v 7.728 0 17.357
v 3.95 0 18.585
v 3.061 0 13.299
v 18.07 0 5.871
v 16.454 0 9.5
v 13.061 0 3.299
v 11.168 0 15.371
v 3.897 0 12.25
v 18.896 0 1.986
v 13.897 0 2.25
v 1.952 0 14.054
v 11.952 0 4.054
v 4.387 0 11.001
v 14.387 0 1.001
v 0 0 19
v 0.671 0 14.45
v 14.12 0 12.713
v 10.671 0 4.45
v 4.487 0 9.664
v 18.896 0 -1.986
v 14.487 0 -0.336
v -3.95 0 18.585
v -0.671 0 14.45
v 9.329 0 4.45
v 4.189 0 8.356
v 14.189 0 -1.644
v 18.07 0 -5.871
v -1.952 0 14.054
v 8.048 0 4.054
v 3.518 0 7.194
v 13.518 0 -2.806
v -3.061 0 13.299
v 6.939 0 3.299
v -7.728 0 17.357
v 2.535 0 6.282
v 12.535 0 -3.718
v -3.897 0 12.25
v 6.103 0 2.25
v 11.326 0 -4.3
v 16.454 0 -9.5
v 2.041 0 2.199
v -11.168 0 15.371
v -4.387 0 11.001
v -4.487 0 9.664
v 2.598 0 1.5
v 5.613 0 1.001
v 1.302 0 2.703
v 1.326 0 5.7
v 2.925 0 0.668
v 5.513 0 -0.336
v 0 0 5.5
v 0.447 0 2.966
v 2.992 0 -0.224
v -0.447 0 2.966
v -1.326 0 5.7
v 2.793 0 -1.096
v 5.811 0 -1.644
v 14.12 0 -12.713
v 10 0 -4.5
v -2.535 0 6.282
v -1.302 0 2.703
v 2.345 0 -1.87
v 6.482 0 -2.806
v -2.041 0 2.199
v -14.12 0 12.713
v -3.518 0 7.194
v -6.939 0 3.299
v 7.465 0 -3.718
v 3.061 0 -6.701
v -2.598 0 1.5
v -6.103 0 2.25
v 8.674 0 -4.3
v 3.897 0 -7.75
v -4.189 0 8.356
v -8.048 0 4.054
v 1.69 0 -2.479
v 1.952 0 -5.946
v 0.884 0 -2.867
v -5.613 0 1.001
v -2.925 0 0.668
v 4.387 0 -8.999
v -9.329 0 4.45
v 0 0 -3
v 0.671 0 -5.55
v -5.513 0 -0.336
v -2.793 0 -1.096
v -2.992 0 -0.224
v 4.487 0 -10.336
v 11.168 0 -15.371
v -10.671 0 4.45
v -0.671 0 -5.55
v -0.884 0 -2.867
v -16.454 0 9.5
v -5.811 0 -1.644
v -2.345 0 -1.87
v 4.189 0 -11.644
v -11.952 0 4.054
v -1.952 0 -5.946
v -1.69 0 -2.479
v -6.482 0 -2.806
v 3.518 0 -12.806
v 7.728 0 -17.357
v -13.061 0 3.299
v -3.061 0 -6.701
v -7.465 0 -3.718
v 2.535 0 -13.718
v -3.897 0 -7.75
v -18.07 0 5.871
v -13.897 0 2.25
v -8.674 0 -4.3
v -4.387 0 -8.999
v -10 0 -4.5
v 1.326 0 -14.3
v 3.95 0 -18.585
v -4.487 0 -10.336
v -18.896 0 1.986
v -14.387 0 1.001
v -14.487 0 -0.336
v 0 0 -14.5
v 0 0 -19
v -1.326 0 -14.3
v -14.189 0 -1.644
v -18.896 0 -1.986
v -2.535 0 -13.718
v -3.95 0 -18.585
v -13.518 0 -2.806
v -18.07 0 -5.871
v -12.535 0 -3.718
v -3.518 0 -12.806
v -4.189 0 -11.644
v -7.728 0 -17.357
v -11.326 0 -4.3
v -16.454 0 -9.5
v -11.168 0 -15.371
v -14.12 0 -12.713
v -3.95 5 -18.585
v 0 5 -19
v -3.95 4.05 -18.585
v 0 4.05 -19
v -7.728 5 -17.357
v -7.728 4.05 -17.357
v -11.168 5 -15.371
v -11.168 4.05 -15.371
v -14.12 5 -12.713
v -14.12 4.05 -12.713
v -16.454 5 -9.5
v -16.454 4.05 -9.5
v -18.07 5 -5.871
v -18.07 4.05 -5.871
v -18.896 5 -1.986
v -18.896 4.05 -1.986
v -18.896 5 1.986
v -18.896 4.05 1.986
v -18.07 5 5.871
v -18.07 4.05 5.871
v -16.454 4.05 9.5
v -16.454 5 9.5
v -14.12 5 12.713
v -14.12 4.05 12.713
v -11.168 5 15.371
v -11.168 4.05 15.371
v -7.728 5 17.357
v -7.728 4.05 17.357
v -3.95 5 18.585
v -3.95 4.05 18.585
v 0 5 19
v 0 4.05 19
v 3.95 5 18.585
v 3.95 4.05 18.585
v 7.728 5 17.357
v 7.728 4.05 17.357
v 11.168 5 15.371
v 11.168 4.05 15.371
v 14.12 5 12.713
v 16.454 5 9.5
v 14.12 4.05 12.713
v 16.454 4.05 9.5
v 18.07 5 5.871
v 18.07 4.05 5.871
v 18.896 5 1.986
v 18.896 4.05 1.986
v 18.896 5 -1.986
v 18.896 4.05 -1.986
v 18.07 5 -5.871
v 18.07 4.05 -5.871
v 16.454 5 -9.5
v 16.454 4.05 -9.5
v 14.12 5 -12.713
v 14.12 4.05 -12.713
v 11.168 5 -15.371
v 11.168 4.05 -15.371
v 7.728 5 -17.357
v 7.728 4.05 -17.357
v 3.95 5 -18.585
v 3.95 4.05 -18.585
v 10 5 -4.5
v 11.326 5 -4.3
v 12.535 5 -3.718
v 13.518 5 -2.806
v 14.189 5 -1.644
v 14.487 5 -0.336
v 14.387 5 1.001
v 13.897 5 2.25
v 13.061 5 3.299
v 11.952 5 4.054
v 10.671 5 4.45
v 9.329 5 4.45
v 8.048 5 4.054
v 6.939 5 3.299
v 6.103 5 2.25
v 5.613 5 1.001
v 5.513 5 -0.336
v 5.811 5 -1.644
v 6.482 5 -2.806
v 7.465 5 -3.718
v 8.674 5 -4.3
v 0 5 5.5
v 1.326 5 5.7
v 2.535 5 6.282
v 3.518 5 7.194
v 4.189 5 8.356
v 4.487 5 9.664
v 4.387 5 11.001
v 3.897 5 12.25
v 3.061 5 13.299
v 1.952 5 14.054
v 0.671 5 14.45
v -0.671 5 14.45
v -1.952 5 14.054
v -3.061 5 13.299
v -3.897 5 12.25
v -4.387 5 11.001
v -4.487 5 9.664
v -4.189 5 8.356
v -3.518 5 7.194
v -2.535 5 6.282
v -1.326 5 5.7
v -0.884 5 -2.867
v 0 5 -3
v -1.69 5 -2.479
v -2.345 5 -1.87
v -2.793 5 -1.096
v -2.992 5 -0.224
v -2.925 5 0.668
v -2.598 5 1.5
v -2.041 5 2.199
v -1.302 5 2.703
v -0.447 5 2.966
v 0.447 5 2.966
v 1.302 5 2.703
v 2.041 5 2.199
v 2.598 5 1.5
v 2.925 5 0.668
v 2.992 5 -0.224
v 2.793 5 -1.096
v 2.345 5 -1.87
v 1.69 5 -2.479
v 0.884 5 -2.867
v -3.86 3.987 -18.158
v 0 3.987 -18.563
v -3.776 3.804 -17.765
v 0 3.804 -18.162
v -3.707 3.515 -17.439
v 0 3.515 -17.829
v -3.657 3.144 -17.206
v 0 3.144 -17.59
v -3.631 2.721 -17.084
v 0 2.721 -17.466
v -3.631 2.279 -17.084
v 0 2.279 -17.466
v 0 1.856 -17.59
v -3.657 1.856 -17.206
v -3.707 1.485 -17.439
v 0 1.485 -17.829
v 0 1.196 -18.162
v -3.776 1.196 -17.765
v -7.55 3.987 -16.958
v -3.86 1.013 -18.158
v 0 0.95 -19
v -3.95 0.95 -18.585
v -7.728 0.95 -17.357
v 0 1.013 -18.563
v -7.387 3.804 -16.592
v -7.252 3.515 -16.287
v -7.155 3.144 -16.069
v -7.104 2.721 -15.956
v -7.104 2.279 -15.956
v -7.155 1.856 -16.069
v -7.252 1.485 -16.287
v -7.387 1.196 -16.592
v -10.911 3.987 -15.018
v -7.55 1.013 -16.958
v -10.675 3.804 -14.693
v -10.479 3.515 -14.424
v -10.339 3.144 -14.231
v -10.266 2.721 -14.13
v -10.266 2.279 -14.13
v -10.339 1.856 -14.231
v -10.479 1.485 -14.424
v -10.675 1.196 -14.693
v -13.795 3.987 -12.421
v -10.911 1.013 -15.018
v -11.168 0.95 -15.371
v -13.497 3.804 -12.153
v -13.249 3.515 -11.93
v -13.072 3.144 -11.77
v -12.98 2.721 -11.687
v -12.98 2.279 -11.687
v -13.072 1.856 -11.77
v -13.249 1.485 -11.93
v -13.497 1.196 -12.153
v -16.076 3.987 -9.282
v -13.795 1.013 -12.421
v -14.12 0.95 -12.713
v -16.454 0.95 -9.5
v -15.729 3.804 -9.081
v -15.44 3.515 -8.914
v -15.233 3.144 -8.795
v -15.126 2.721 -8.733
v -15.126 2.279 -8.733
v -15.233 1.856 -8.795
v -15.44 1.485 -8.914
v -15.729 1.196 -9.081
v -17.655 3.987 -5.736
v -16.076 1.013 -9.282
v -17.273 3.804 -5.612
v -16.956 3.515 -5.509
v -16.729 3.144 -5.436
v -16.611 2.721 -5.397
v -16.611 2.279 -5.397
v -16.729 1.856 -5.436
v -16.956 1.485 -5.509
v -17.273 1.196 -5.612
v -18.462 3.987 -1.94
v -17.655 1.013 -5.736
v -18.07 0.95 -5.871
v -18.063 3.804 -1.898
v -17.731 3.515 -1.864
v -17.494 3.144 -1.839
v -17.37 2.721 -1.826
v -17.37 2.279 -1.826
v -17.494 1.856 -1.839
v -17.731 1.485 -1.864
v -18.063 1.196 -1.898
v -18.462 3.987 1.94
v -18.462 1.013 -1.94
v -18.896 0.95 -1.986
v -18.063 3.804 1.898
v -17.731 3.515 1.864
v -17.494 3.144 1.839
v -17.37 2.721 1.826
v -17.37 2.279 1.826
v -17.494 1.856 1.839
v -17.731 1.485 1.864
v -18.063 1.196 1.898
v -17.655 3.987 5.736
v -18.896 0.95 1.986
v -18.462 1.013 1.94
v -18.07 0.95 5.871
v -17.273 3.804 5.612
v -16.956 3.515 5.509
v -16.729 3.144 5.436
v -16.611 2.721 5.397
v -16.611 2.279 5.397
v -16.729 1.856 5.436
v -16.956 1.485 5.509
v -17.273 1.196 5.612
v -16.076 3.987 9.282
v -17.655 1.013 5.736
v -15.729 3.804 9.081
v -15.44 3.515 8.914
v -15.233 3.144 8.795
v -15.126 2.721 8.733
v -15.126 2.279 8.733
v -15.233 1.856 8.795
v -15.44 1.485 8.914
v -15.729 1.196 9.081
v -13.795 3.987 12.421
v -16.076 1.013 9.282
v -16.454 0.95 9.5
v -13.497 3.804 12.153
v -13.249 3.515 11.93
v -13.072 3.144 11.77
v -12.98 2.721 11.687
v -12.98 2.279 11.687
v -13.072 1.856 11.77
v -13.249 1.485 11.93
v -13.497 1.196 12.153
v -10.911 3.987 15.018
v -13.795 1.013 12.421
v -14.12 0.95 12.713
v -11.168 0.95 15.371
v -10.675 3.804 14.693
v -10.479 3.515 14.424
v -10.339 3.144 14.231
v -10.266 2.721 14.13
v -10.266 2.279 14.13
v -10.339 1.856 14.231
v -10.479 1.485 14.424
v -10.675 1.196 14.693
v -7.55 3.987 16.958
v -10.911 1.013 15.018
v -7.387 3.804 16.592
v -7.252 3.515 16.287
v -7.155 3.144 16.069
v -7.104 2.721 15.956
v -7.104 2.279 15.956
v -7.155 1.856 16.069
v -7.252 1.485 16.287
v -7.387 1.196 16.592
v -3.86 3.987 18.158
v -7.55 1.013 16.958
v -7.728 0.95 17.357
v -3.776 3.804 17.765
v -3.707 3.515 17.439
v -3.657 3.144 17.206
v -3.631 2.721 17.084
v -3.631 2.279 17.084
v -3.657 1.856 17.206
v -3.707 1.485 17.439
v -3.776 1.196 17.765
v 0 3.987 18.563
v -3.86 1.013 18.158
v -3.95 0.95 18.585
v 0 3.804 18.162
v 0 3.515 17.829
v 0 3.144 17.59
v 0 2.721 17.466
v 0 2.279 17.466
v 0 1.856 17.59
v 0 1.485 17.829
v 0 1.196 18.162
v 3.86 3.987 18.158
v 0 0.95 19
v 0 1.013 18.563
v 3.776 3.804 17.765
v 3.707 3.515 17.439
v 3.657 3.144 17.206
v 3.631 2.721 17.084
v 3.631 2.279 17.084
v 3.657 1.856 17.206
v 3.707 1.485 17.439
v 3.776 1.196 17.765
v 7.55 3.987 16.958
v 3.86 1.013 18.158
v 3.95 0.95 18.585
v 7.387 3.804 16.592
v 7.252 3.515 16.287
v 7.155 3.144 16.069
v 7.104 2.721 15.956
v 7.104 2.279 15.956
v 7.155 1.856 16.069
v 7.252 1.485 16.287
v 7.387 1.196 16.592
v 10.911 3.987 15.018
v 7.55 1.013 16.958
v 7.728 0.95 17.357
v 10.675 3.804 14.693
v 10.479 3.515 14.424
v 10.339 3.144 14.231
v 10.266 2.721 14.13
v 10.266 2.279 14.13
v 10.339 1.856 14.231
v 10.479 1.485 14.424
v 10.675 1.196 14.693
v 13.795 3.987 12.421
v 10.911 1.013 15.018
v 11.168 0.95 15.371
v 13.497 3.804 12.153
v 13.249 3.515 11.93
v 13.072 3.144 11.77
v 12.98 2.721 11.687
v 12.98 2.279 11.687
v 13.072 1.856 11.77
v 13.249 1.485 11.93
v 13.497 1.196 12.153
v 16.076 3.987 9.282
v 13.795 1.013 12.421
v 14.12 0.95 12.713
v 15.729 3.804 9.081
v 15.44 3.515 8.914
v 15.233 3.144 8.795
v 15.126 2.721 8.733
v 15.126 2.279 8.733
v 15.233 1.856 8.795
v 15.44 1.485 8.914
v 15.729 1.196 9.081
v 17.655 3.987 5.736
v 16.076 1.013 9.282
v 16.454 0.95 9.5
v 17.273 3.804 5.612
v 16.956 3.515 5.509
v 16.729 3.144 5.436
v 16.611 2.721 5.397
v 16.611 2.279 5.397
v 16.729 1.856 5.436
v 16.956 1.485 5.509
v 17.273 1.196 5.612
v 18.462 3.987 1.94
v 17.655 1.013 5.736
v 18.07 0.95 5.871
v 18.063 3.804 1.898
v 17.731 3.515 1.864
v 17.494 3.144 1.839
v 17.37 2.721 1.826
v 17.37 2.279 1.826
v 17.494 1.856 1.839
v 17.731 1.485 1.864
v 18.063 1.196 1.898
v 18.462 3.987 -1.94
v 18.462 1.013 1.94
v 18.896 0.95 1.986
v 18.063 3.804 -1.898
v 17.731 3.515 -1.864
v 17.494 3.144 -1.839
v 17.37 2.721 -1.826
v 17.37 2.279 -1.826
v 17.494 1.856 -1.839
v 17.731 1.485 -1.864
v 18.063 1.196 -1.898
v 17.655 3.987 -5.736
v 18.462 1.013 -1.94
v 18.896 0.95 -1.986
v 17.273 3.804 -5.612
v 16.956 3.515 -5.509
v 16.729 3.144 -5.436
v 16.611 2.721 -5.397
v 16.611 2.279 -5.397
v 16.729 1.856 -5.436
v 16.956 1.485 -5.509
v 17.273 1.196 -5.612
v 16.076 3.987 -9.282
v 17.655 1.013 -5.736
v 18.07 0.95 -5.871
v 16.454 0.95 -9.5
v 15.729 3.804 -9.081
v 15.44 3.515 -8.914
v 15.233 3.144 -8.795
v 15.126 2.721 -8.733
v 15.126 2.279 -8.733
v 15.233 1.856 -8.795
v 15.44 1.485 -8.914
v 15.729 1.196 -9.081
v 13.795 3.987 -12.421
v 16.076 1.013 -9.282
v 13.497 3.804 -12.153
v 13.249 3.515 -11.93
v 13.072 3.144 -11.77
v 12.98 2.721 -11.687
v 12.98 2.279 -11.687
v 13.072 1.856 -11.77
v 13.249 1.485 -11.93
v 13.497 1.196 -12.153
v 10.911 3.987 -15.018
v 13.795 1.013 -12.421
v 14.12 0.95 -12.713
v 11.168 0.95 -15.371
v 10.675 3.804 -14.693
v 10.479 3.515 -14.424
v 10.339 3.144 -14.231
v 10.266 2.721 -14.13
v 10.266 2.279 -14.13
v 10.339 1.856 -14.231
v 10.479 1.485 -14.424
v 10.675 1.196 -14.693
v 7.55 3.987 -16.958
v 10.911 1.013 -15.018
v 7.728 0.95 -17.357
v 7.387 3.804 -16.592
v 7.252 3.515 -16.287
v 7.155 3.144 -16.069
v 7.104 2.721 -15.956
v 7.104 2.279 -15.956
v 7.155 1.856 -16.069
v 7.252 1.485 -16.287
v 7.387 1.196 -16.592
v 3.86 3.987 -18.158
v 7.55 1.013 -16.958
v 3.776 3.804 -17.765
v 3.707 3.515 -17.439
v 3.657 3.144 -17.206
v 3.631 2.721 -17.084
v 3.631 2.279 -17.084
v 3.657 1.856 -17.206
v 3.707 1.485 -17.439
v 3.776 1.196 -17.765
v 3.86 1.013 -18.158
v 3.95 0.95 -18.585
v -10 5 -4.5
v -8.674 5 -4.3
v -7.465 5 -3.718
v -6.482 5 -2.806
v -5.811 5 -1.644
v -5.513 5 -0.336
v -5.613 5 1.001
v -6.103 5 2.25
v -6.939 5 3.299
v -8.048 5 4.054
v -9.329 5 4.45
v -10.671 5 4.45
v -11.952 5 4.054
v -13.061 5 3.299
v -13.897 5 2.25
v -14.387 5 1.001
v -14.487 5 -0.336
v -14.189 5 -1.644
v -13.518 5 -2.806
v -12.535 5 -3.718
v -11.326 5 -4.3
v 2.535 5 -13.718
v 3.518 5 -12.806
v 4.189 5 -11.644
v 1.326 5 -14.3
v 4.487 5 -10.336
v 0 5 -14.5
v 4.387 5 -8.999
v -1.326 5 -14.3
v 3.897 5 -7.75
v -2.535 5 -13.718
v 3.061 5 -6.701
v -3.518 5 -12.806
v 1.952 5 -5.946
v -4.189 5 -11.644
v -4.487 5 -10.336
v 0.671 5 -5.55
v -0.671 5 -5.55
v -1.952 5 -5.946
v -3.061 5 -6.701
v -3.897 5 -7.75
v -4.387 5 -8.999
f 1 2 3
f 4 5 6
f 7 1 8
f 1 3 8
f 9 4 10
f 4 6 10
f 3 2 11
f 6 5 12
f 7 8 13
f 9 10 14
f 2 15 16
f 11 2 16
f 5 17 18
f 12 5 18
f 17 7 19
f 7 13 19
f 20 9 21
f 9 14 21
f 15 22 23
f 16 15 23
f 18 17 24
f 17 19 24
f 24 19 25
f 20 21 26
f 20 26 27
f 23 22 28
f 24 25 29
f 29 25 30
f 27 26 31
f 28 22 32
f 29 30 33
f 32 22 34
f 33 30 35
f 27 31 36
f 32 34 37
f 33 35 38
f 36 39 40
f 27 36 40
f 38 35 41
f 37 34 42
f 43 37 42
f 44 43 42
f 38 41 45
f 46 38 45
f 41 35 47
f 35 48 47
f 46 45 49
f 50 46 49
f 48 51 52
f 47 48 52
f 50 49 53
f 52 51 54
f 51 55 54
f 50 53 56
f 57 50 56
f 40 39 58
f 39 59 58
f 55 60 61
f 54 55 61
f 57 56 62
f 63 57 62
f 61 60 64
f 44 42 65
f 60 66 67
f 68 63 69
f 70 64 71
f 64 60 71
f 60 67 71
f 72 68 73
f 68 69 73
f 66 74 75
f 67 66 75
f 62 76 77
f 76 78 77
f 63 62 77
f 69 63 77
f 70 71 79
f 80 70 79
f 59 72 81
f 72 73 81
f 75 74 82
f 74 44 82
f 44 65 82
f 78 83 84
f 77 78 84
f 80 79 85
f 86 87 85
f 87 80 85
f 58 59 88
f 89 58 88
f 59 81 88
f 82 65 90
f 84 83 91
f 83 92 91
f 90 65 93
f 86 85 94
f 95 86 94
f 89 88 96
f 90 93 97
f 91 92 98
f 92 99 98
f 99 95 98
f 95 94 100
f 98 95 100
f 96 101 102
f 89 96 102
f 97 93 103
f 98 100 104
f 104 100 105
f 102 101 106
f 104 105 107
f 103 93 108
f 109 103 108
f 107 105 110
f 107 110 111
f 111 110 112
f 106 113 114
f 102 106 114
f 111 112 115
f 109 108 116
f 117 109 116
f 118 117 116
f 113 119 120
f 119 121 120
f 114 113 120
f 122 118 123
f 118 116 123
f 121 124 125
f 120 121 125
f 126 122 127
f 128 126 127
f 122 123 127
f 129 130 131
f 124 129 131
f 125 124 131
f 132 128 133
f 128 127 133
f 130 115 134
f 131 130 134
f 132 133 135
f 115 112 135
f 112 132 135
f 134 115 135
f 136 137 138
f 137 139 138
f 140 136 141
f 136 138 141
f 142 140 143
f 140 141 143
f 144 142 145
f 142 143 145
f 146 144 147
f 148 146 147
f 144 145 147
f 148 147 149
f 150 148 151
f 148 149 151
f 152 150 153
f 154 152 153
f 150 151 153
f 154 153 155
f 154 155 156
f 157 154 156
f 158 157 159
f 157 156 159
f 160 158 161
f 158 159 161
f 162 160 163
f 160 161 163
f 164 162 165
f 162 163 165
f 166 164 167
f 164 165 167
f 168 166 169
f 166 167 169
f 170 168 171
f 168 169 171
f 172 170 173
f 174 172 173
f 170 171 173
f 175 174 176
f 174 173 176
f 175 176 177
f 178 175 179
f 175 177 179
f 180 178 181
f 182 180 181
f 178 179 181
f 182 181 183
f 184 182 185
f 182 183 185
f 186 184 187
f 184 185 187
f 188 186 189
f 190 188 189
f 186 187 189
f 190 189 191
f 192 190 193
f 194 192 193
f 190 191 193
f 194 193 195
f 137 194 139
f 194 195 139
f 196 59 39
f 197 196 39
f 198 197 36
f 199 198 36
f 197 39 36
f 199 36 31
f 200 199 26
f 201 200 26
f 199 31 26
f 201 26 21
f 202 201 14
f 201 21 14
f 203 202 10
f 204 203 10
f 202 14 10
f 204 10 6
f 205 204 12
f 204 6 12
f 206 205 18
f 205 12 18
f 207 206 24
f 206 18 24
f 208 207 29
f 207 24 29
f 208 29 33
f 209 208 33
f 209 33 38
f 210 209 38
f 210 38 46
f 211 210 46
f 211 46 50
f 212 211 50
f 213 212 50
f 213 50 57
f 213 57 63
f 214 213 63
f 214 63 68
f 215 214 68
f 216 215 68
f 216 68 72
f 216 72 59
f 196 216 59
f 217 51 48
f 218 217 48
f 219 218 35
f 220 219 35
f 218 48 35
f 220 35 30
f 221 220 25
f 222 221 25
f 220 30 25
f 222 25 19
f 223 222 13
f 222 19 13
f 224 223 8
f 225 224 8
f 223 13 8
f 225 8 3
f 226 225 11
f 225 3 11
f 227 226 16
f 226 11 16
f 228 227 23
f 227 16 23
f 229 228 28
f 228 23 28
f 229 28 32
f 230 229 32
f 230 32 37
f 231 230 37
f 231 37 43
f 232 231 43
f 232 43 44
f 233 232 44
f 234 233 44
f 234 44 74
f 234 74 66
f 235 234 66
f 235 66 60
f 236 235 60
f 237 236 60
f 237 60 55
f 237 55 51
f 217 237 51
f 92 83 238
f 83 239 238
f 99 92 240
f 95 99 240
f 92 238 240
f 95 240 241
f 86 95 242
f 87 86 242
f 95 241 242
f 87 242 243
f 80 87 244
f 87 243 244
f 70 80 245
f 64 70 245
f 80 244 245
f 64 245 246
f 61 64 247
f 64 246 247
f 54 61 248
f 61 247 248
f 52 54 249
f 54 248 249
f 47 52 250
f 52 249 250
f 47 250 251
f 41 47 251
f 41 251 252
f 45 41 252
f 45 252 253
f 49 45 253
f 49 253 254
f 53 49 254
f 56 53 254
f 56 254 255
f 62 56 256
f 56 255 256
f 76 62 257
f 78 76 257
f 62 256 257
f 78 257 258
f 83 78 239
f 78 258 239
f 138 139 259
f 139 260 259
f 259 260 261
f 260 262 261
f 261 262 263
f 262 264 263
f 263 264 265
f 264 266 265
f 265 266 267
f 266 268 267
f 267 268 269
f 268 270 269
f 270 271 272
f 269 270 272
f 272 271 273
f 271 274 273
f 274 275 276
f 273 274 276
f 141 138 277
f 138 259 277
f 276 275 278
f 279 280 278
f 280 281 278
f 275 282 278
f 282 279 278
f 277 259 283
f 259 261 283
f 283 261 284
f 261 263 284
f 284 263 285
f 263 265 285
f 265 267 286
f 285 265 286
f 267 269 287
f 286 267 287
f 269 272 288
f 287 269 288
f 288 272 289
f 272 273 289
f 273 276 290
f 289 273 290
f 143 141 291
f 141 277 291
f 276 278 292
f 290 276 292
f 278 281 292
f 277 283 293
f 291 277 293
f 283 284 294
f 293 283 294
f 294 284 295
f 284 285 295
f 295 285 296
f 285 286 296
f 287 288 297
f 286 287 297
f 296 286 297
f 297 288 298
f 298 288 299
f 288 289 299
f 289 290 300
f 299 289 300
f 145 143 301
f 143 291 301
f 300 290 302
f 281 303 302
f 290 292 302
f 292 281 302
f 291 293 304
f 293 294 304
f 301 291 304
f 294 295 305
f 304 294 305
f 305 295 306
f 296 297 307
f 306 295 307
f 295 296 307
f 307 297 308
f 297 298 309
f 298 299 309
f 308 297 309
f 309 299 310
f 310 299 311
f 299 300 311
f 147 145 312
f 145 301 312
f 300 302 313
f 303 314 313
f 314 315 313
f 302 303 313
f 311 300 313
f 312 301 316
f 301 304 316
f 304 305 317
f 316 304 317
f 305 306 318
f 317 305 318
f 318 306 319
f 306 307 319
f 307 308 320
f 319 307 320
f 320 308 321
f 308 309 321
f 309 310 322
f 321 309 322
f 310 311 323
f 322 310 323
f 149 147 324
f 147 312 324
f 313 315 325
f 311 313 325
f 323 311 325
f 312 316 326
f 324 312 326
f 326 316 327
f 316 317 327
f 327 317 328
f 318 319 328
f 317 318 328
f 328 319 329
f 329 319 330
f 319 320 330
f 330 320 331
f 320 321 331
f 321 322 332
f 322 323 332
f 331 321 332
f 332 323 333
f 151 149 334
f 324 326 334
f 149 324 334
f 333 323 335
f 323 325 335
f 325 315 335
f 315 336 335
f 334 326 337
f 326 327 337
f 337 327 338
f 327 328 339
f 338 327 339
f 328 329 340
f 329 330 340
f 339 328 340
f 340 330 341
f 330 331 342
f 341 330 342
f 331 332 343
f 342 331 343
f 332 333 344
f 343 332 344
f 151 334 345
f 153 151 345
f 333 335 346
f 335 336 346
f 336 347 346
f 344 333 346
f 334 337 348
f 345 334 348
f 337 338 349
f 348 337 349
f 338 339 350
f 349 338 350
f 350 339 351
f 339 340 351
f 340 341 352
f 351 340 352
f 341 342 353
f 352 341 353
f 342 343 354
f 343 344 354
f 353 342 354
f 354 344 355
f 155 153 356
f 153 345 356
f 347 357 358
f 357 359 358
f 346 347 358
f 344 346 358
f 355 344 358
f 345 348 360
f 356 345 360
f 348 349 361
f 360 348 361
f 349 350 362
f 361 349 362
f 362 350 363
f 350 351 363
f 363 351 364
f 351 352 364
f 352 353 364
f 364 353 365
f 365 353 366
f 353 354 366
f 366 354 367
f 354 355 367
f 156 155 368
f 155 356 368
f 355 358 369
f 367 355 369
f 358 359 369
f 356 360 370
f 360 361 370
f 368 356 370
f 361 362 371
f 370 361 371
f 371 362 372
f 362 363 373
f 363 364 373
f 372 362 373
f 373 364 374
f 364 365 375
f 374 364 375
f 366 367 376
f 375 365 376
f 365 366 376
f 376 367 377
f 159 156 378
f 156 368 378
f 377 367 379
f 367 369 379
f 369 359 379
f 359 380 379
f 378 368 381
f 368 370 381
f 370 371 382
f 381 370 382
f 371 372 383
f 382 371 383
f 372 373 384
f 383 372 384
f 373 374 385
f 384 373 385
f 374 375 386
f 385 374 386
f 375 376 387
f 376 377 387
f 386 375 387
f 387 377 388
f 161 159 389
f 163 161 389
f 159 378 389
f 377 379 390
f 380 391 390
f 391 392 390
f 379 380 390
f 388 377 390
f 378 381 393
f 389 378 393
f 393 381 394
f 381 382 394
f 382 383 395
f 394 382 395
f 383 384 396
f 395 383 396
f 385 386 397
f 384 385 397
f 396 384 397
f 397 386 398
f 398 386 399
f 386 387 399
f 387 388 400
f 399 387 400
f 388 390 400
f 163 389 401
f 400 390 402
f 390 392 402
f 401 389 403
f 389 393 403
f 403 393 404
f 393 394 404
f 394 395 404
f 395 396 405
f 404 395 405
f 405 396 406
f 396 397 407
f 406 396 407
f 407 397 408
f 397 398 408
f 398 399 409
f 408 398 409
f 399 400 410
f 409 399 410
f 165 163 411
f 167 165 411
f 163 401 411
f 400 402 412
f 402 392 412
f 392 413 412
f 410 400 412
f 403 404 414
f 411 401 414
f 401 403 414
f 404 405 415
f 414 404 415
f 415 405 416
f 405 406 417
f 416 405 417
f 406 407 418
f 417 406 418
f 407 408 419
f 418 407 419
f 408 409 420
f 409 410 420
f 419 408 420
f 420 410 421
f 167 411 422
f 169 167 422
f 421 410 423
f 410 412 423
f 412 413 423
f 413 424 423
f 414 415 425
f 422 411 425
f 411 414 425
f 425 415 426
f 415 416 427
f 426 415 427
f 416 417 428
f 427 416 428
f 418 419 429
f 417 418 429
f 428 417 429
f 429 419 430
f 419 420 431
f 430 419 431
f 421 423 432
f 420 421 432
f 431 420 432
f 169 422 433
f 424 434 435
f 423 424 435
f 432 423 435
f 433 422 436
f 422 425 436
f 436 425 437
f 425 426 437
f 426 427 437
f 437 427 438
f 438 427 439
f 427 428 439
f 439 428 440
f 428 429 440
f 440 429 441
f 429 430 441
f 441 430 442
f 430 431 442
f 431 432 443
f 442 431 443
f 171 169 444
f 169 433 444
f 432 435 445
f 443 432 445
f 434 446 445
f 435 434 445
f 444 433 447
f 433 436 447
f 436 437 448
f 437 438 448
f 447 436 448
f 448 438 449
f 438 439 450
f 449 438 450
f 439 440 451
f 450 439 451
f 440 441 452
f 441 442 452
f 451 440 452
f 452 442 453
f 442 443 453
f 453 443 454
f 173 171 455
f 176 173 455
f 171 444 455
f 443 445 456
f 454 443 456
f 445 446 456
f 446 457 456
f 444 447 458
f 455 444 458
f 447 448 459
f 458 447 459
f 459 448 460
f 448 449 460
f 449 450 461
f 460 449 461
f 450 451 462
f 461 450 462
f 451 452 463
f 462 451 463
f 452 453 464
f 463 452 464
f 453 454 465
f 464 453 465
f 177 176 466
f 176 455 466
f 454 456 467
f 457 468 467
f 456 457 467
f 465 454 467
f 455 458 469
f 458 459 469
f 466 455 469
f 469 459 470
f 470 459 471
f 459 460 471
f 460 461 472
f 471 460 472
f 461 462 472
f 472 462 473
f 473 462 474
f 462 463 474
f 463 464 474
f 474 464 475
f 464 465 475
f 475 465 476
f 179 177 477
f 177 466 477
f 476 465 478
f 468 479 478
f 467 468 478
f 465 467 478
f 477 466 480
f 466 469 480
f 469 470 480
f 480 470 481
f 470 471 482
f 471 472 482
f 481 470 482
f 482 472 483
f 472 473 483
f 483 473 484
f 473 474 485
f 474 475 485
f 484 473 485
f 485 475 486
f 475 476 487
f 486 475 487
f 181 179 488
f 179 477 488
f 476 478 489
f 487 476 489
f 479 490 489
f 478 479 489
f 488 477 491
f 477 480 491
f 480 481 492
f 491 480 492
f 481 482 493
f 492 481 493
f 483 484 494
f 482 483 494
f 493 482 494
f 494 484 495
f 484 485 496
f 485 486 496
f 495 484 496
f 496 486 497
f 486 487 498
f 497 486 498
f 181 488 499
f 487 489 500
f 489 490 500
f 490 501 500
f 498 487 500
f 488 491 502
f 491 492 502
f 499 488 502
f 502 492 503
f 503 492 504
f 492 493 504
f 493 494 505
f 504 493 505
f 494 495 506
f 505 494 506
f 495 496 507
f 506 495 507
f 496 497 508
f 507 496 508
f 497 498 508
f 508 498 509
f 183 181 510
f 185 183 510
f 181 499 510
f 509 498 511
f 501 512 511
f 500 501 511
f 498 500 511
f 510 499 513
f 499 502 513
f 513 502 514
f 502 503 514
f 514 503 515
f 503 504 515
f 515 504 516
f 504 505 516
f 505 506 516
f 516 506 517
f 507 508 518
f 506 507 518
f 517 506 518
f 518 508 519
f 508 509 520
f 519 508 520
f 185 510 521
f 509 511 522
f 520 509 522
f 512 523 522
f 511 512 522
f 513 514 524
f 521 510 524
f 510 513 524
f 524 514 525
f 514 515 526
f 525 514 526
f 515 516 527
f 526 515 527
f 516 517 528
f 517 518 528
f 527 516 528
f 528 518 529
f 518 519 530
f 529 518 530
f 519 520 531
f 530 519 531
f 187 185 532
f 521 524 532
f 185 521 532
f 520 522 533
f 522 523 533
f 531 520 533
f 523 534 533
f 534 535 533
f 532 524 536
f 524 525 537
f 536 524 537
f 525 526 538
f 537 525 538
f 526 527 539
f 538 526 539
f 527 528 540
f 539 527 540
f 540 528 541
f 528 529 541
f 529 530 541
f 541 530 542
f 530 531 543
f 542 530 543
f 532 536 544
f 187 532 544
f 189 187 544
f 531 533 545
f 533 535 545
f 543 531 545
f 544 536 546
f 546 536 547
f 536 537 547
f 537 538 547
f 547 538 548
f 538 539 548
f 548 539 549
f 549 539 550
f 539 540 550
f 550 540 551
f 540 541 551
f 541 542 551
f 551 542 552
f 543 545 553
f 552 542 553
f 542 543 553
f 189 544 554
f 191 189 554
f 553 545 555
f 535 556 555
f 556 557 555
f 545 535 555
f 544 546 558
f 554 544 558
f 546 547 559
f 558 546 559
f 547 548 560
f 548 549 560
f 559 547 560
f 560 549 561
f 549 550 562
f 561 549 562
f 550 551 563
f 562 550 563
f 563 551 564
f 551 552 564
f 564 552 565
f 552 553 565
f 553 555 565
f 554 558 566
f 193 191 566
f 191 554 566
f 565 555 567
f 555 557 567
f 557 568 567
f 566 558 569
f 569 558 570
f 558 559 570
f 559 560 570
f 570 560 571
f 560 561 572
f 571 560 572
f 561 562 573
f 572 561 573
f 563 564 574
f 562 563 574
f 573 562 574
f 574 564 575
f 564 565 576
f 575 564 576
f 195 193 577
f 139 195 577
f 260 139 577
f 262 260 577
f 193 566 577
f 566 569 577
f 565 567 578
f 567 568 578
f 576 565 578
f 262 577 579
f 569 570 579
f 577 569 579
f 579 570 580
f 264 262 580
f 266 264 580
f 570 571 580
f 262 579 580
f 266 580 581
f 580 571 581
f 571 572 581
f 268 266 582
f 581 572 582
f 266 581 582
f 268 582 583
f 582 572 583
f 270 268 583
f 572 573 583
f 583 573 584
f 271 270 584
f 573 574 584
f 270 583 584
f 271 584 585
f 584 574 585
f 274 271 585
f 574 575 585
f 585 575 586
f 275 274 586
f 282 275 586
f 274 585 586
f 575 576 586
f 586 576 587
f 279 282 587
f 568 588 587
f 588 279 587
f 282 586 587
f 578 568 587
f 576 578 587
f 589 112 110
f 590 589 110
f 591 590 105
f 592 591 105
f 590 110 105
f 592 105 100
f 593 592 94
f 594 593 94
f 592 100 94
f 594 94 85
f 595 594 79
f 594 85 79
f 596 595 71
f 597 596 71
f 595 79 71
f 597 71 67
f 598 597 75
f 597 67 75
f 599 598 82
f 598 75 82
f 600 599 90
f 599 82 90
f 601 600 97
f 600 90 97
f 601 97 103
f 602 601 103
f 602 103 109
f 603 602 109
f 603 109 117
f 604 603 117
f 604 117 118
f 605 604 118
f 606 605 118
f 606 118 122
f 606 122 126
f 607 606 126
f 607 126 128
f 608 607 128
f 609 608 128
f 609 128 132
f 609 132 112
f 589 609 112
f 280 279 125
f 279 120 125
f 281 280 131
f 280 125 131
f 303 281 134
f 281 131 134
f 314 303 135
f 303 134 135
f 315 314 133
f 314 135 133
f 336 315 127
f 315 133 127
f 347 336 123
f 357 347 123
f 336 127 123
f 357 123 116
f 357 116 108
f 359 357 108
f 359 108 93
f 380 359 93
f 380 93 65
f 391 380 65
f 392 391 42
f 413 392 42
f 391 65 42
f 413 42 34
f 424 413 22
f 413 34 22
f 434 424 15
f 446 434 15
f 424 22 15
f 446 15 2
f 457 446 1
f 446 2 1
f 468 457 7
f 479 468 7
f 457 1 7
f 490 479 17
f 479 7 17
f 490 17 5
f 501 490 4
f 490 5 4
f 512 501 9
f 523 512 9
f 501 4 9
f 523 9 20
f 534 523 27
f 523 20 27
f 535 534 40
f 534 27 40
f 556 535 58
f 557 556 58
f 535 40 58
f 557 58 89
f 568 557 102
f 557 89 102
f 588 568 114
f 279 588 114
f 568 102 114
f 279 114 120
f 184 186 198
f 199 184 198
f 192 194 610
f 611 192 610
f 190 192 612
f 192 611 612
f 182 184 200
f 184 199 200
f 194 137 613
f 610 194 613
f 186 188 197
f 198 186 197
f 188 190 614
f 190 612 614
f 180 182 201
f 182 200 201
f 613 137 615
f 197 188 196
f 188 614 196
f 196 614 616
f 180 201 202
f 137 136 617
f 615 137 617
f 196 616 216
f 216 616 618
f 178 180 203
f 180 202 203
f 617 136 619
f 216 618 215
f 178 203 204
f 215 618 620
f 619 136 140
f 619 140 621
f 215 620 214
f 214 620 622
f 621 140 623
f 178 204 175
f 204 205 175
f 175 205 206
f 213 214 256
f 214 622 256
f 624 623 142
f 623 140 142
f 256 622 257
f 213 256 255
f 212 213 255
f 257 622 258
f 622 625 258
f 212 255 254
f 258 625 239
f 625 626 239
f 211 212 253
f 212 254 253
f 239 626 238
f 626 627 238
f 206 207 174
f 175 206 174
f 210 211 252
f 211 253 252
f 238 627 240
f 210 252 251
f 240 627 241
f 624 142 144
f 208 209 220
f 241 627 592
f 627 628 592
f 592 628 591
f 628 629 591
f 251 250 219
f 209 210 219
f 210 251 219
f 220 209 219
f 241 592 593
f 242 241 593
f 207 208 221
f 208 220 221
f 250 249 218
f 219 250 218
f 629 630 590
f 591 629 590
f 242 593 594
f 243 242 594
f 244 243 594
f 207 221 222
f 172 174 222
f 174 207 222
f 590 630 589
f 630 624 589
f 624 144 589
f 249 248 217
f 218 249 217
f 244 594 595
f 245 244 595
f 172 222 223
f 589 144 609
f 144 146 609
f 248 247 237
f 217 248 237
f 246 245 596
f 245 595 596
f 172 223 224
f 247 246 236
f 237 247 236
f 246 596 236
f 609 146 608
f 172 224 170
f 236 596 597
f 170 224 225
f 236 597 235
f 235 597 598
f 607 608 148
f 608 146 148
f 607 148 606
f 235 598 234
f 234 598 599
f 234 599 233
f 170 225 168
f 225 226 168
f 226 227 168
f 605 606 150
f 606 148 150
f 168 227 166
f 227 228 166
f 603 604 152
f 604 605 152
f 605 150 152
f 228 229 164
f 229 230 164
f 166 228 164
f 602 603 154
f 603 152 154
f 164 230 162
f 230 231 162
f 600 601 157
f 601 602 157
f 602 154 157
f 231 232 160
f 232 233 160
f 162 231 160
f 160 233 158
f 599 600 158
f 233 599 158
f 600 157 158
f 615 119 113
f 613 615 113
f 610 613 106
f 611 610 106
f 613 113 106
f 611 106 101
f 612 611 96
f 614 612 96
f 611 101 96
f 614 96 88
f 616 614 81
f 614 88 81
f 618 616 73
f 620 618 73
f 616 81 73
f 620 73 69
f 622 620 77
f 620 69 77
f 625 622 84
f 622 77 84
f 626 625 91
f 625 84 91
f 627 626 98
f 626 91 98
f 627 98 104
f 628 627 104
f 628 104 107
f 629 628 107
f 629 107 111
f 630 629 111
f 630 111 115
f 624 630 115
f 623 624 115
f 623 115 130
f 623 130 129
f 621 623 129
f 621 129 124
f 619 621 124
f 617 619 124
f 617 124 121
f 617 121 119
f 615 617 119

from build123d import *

# Parameters (mm, degrees)
ESQUISSE2_R             = 4.5
ENL_V_MAT_EXTRU_1_DEPTH = 28.331300737


with BuildPart() as part:
    # Esquisse1 → Révolution1 (revolve)
    with BuildSketch(Plane.XY, mode=Mode.PRIVATE) as r_volution1_sk:
        with BuildLine():
            Line((-19, 0), (-3, 0))
            Line((-3, 0), (-3, 5))
            Line((-3, 5), (-19, 5))
            Line((-19, 5), (-19, 4.05))
            ThreePointArc((-19, 4.05), (-17.45, 2.5), (-19, 0.95))
            Line((-19, 0.95), (-19, 0))
        make_face()
    revolve(r_volution1_sk.sketch.rotate(Axis((0, 0, 0), (0, 1, 0)), 270), axis=Axis((0, 0, 0), (0, 1, 0)))

    # Esquisse2 → Enlèv. mat.-Extru.1 (cut, through all)
    with BuildSketch(Plane(origin=(0, 0, 0), x_dir=(-1, 0, 0), z_dir=(0, -1, 0))):
        with Locations(Location((0, -10, 0), (0, 0, 90))):
            Circle(ESQUISSE2_R)
        with Locations(Location((-10, 0, 0), (0, 0, 90))):
            Circle(ESQUISSE2_R)
        with Locations(Location((0, 10, 0), (0, 0, 90))):
            Circle(ESQUISSE2_R)
        with Locations(Location((10, 0, 0), (0, 0, 90))):
            Circle(ESQUISSE2_R)
    extrude(amount=-ENL_V_MAT_EXTRU_1_DEPTH, mode=Mode.SUBTRACT)


solid = part.part
